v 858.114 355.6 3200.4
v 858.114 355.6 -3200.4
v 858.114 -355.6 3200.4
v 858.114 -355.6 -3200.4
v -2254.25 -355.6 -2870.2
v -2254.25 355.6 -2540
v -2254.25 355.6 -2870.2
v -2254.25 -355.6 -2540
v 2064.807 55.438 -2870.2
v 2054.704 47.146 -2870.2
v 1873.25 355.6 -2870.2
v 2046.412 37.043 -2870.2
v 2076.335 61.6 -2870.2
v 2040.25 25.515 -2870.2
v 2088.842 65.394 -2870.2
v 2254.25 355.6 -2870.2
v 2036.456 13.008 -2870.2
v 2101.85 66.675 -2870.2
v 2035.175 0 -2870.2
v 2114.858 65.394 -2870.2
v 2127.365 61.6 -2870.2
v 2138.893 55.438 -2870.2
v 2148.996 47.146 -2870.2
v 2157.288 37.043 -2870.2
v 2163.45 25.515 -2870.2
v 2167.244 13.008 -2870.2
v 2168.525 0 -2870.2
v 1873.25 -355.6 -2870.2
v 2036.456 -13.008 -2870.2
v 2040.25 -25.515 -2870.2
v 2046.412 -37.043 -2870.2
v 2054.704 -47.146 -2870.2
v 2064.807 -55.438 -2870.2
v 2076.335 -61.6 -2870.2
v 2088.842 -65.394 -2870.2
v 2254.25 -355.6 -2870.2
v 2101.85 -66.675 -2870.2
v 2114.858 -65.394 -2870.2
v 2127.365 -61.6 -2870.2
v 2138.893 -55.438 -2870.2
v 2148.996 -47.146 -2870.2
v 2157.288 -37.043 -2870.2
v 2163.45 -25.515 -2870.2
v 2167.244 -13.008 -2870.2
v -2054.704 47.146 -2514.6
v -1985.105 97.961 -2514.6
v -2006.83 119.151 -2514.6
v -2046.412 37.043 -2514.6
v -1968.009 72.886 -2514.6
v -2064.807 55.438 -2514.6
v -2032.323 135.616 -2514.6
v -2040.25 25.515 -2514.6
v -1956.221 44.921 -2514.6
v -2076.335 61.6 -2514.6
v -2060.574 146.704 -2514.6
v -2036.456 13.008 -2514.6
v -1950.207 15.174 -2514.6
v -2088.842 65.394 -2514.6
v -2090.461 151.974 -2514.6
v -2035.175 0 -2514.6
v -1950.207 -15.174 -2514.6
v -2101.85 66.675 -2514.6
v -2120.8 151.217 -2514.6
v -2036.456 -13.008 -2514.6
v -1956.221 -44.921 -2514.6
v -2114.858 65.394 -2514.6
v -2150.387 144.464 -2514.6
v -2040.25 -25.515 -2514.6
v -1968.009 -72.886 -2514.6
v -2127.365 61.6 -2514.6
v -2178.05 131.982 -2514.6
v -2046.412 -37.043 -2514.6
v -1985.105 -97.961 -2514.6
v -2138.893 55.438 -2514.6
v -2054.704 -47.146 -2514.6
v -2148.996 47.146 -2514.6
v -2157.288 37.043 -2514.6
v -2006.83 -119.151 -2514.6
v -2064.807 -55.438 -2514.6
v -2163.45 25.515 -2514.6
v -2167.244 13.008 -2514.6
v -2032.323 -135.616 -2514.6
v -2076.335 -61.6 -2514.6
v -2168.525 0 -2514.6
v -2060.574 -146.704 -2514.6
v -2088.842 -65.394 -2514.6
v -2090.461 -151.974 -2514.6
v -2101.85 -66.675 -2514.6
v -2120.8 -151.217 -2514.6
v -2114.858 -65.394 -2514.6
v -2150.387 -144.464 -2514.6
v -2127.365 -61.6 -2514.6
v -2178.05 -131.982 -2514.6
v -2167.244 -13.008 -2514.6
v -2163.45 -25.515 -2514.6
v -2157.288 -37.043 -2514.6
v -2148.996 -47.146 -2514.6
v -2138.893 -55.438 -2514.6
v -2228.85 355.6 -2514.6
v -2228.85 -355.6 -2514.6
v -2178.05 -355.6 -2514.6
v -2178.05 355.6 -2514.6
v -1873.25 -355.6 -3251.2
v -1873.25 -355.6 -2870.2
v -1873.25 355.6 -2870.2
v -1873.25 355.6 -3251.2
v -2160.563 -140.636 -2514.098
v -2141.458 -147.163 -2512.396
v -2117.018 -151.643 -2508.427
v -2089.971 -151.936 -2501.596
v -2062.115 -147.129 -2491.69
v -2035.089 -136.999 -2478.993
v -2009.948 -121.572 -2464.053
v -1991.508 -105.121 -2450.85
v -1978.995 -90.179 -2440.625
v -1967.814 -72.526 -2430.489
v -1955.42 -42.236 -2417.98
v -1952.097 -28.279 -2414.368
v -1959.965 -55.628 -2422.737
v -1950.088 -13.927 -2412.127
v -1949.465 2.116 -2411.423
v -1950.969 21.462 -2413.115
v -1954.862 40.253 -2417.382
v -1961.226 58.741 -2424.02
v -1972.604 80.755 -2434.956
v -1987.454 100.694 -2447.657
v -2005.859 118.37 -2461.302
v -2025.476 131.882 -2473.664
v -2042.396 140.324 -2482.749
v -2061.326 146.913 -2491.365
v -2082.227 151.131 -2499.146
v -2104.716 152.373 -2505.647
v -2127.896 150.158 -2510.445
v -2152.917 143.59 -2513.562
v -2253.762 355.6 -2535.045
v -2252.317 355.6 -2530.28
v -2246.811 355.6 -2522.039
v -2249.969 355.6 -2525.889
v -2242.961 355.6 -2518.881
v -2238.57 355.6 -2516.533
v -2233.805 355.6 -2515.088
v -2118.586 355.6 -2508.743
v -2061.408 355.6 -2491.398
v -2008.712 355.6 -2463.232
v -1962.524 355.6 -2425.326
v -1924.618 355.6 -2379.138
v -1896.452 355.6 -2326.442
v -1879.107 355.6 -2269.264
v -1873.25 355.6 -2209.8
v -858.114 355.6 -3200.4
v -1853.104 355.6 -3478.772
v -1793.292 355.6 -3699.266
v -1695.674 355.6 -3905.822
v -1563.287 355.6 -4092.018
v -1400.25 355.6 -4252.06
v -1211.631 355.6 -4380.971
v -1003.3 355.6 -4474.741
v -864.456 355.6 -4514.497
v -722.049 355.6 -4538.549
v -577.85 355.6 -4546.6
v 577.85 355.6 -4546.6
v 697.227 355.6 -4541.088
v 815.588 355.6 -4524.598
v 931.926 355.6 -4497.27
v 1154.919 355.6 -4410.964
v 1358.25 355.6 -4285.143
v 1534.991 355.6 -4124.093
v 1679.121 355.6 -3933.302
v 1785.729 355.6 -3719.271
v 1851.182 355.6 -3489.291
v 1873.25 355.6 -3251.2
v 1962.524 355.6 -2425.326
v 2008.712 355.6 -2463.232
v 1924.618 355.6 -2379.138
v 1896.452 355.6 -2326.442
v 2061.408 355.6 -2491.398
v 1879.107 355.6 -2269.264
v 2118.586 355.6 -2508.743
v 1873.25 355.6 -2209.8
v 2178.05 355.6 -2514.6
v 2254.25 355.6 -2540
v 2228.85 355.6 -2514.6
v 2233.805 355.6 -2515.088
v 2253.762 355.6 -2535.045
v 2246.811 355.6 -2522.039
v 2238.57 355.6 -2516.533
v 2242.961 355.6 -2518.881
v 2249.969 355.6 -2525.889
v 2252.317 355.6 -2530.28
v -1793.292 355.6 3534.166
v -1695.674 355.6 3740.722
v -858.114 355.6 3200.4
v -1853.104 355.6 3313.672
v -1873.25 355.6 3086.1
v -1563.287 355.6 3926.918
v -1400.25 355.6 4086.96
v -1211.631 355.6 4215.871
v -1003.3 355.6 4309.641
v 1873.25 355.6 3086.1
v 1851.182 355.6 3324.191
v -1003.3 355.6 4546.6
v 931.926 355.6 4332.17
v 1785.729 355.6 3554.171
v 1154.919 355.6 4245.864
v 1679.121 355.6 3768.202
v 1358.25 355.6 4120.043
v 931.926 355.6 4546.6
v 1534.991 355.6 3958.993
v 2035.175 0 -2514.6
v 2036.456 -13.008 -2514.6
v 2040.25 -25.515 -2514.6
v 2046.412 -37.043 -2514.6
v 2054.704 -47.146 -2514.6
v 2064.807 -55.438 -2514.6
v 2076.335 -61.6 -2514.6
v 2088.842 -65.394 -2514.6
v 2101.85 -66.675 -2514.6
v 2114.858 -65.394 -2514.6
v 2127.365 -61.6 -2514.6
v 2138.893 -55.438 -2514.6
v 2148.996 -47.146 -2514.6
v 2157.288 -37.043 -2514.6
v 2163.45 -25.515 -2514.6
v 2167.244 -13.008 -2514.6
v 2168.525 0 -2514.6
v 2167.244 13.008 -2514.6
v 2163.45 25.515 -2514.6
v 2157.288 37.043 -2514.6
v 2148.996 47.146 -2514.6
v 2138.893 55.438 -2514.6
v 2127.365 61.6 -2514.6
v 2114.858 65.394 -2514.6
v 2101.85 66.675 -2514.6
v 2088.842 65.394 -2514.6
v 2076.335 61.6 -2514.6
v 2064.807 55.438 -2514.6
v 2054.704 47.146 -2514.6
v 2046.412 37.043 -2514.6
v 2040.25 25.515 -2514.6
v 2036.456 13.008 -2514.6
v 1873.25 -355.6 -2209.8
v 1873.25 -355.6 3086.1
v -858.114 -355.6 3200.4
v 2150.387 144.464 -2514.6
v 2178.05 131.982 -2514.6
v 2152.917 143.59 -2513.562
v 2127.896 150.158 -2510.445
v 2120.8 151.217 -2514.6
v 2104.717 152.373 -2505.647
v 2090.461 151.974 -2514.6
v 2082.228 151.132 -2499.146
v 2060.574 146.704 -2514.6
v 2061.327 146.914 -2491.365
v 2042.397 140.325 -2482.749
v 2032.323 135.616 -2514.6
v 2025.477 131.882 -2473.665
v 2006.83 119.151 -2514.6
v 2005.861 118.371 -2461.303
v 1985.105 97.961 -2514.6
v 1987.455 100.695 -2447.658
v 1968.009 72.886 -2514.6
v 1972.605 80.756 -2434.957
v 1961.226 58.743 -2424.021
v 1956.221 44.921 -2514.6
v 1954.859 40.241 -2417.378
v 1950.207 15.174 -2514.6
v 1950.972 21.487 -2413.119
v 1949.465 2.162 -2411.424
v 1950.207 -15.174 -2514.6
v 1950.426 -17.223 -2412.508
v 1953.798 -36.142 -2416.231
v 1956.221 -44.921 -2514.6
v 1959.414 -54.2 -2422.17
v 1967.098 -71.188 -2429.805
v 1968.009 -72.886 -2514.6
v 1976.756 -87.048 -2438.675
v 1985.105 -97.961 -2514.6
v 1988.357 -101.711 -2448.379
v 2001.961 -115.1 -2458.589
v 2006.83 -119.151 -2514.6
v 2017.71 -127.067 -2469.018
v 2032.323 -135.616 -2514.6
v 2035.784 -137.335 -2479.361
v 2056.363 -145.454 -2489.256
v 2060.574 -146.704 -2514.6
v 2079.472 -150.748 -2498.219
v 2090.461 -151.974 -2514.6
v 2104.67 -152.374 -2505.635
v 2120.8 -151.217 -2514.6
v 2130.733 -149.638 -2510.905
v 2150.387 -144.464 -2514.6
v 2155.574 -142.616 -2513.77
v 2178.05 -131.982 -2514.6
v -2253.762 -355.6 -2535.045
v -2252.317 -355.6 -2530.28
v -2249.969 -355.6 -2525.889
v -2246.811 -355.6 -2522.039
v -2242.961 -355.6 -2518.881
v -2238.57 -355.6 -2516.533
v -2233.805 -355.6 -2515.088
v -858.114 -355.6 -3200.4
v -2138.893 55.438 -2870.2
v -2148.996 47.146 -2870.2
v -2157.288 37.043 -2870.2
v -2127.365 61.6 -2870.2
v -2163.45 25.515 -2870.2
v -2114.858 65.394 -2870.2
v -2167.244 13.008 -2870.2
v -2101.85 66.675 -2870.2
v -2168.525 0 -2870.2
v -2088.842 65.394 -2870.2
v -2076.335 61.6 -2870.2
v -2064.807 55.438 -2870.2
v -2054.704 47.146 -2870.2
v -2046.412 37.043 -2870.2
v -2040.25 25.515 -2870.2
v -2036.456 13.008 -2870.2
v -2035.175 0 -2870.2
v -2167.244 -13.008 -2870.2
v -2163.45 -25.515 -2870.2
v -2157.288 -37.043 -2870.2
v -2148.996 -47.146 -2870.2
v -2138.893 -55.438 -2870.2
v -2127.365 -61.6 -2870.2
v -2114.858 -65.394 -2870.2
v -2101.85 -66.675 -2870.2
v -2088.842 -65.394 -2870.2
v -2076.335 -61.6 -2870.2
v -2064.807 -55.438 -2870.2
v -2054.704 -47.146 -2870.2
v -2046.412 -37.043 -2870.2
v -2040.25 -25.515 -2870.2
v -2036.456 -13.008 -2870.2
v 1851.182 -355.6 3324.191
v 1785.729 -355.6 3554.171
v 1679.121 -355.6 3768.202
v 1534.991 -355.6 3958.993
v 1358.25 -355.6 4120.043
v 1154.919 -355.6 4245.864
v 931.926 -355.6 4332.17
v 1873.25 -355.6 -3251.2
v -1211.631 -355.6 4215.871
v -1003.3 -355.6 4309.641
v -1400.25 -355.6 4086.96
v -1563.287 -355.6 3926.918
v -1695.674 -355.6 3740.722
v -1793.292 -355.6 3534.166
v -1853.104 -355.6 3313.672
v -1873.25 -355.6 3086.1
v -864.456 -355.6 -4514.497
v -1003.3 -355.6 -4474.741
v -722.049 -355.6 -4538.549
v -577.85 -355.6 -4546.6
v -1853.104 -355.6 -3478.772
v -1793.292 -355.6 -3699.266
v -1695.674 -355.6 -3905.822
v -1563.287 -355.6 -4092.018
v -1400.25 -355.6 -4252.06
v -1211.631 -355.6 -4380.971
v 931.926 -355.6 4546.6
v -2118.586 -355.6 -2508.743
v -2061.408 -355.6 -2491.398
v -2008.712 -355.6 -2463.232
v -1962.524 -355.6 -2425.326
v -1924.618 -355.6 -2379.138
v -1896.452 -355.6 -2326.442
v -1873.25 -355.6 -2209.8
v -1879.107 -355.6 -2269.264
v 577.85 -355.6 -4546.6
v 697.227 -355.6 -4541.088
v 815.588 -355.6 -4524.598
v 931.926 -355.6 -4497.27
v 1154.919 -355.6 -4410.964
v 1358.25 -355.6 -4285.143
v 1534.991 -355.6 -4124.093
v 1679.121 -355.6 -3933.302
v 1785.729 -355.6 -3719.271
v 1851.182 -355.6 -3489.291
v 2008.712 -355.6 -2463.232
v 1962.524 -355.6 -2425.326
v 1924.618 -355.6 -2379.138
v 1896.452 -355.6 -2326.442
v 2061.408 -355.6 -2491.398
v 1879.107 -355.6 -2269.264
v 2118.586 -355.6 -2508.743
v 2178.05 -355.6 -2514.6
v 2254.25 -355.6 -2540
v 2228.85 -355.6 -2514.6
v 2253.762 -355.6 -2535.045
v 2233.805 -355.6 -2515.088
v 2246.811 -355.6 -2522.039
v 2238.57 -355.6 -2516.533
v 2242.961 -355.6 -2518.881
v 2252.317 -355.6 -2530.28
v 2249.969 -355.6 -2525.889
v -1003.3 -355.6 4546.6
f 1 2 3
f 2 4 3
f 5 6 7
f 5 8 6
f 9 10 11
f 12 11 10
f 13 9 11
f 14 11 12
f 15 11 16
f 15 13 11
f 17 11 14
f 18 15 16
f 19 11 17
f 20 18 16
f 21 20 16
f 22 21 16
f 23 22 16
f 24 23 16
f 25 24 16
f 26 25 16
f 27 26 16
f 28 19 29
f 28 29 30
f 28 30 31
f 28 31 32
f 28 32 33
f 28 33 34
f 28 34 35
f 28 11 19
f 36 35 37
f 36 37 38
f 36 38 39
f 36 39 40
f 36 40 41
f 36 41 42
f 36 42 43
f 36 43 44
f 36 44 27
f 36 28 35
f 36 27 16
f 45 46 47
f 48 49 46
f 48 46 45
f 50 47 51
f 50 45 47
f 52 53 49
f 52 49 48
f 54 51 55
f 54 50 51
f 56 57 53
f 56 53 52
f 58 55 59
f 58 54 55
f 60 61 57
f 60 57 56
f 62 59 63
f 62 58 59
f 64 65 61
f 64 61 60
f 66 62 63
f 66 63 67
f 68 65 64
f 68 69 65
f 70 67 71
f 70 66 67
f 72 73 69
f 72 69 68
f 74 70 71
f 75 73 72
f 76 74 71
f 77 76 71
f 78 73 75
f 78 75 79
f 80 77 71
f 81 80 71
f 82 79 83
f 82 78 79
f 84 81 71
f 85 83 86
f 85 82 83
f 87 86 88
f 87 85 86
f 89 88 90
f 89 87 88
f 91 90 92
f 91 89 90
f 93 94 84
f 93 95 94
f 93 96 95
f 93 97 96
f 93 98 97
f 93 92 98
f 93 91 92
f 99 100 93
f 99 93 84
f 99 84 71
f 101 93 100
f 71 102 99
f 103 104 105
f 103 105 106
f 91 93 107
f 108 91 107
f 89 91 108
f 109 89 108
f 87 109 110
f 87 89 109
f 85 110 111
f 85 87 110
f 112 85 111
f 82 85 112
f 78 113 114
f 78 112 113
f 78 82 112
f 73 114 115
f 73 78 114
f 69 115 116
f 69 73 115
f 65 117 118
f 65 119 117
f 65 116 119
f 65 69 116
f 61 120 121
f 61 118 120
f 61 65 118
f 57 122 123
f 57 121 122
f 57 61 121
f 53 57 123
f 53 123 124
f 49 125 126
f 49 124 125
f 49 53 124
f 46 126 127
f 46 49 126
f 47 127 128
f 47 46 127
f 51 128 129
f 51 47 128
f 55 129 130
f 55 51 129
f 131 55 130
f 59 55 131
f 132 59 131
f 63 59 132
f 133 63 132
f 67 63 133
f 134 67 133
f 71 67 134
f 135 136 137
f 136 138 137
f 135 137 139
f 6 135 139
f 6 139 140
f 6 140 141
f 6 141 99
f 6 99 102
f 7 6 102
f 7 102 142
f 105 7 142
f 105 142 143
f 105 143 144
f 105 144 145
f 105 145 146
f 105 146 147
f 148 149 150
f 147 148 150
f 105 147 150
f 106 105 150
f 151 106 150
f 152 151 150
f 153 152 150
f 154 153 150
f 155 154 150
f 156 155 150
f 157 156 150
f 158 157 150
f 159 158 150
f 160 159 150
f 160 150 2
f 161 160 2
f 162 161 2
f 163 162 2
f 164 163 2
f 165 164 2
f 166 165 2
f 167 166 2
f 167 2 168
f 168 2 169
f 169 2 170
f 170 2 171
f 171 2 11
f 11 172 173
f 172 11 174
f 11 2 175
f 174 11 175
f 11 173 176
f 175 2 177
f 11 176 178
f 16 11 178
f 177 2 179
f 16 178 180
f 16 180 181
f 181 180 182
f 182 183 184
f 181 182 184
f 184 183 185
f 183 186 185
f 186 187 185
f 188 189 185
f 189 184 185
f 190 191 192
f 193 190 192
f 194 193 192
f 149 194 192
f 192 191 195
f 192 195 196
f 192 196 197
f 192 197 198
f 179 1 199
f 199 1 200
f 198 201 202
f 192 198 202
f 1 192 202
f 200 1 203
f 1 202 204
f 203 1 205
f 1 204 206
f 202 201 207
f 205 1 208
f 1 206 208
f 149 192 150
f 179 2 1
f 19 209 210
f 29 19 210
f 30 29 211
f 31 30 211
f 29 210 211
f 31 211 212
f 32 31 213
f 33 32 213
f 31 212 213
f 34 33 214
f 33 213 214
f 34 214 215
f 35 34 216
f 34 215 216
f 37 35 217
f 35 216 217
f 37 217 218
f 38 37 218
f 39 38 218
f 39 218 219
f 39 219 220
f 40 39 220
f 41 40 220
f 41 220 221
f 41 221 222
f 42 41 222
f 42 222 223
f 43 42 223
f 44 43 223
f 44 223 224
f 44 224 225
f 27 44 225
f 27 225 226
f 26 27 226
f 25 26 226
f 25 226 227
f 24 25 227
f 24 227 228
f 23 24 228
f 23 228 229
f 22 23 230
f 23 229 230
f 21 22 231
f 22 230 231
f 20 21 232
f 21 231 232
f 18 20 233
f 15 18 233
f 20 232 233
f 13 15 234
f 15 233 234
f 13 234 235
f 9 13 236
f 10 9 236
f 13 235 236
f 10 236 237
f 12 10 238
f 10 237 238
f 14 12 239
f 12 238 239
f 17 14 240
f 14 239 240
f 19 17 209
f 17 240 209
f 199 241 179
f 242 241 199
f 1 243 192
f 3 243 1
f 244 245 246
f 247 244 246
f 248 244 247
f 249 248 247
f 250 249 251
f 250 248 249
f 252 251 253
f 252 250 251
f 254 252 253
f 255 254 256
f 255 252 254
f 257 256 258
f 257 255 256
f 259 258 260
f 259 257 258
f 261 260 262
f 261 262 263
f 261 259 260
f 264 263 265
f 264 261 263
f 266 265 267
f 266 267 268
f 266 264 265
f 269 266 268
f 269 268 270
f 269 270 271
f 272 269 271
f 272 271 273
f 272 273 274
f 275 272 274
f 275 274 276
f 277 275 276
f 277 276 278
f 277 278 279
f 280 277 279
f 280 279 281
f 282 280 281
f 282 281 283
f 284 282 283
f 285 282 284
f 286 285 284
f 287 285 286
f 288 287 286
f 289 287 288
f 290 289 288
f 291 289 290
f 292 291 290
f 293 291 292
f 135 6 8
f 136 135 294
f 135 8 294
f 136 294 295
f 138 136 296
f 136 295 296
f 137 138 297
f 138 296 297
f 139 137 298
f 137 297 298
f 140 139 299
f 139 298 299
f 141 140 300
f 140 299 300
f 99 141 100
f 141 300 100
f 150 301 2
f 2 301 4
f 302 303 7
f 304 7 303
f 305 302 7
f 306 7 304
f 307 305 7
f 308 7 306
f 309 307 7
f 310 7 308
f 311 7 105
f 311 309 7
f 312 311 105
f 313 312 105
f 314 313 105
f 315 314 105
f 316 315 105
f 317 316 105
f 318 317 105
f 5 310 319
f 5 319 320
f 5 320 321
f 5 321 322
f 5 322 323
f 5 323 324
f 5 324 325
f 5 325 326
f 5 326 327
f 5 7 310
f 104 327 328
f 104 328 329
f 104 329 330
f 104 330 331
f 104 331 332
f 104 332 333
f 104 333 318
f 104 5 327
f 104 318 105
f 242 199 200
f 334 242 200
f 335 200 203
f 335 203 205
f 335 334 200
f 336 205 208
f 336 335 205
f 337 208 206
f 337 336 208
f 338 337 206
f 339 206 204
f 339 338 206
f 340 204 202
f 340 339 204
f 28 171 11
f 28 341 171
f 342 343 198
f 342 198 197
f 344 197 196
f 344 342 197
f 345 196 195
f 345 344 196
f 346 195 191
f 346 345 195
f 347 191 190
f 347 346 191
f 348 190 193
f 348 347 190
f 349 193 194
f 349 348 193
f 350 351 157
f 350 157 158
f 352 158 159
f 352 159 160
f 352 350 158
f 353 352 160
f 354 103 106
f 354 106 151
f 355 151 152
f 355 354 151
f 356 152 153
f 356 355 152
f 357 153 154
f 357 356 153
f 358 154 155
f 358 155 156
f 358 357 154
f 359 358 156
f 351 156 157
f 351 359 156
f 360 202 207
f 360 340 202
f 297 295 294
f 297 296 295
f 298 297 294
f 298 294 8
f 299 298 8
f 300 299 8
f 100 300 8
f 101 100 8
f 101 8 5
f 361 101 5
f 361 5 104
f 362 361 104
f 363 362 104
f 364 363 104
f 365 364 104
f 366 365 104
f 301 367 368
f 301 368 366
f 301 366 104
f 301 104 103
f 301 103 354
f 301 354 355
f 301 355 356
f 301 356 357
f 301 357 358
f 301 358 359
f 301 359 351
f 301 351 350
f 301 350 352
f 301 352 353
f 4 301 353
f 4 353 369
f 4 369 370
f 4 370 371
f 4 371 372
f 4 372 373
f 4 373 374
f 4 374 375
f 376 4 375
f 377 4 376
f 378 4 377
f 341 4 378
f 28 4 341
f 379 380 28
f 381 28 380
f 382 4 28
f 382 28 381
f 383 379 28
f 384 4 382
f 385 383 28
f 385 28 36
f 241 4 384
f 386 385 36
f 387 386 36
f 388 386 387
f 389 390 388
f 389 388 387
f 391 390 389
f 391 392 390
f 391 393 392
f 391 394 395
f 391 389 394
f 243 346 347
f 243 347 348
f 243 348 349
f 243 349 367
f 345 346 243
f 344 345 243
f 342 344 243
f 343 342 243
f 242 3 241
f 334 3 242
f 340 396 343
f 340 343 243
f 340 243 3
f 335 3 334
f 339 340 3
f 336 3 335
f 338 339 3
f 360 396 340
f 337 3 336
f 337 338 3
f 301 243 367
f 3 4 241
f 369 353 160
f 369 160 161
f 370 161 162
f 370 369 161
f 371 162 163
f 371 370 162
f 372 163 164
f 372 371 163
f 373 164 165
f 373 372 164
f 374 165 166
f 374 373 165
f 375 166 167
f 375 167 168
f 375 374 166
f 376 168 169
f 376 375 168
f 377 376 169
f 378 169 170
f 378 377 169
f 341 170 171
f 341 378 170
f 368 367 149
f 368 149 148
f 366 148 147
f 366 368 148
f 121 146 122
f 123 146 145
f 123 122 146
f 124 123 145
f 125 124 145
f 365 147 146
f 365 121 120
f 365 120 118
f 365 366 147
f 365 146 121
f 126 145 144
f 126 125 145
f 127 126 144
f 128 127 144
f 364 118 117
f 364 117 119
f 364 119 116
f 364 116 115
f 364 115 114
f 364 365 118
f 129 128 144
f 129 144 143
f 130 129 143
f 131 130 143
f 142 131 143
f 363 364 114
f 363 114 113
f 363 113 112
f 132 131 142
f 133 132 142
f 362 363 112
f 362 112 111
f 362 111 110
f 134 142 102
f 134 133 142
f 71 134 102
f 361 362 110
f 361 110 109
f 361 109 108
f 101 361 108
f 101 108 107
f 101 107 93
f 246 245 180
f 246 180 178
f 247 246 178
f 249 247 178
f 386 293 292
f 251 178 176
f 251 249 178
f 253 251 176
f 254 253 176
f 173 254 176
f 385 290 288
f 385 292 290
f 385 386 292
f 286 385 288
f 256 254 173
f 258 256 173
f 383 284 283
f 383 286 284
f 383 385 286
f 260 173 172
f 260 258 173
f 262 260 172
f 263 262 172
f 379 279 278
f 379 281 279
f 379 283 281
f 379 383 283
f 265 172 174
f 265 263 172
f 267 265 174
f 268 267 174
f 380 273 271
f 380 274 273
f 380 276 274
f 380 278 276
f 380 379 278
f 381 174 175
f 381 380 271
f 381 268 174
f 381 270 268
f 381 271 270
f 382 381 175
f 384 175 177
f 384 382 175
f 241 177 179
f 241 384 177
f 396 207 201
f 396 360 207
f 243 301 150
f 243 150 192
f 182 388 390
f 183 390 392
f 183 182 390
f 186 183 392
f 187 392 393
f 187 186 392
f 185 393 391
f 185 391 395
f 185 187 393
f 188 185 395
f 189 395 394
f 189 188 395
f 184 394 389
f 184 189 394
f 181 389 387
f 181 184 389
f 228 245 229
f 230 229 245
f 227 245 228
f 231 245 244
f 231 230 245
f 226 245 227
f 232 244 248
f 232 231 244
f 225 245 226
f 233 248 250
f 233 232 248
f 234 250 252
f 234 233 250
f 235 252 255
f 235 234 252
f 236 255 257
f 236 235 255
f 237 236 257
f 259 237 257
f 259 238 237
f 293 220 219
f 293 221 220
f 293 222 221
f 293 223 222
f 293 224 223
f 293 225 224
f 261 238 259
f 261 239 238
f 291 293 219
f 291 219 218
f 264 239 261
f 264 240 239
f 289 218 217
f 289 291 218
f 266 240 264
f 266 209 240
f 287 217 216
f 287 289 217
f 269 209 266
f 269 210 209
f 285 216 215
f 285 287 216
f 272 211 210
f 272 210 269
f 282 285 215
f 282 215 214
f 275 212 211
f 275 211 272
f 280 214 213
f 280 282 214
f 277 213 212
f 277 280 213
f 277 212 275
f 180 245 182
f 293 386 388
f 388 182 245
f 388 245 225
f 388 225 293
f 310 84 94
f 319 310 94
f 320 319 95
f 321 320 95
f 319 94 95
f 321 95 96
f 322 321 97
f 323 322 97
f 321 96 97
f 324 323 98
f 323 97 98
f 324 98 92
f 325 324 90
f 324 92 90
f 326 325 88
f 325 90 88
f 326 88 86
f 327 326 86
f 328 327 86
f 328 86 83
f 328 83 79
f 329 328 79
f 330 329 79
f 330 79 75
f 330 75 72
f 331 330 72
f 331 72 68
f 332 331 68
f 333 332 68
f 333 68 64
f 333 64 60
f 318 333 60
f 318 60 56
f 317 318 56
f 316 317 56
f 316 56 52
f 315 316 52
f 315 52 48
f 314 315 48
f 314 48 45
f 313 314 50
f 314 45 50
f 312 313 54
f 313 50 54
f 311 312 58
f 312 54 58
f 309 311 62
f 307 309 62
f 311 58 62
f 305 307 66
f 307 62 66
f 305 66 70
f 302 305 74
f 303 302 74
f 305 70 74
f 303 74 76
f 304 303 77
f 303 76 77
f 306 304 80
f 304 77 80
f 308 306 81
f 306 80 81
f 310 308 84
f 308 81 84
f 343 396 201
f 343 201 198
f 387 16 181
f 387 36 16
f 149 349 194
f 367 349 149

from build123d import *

# Parameters (mm, degrees)
F0_W     = 1716.2272
F0_H     = 6400.8
F1_DEPTH = 355.6
F2_R     = 25.4
F4_D     = 133.35
F5_R     = 152.4
F6_DEPTH = 7061.201


with BuildPart() as f1:
    # F0 (on Front) → F1 (new body, symmetric)
    with BuildSketch(Plane.XZ):
        with BuildLine():
            Line((931.926, 4546.6), (-1003.3, 4546.6))
            Line((-1003.3, 4546.6), (-1003.3, 4309.641359))
            ThreePointArc((-1003.3, 4309.641359), (-1633.593598, 3836.744133), (-1873.25, 3086.1))
            Line((-1873.25, 3086.1), (-1873.25, -2209.8))
            ThreePointArc((-1873.25, -2209.8), (-1962.523853, -2425.326147), (-2178.05, -2514.6))
            Line((-2178.05, -2514.6), (-2254.25, -2514.6))
            Line((-2254.25, -2514.6), (-2254.25, -2870.2))
            Line((-2254.25, -2870.2), (-1873.25, -2870.2))
            Line((-1873.25, -2870.2), (-1873.25, -3251.2))
            ThreePointArc((-1873.25, -3251.2), (-1633.593598, -4001.844133), (-1003.3, -4474.741359))
            ThreePointArc((-1003.3, -4474.741359), (-793.5879, -4528.509014), (-577.85, -4546.6))
            Line((-577.85, -4546.6), (577.85, -4546.6))
            ThreePointArc((577.85, -4546.6), (756.597886, -4534.208322), (931.926, -4497.270362))
            ThreePointArc((931.926, -4497.270362), (1611.467727, -4032.030042), (1873.25, -3251.2))
            Line((1873.25, -3251.2), (1873.25, -2870.2))
            Line((1873.25, -2870.2), (2254.25, -2870.2))
            Line((2254.25, -2870.2), (2254.25, -2514.6))
            Line((2254.25, -2514.6), (2178.05, -2514.6))
            ThreePointArc((2178.05, -2514.6), (1962.523853, -2425.326147), (1873.25, -2209.8))
            Line((1873.25, -2209.8), (1873.25, 3086.1))
            ThreePointArc((1873.25, 3086.1), (1611.467727, 3866.930042), (931.926, 4332.170362))
            Line((931.926, 4332.170362), (931.926, 4546.6))
        make_face()
        Rectangle(F0_W, F0_H, mode=Mode.SUBTRACT)
    extrude(amount=F1_DEPTH, both=True)

    # F2
    f2_edges = [f1.edges().sort_by_distance(p)[0] for p in [
        (2254.25, 177.8, -2514.6),
        (-2254.25, 177.8, -2514.6),
    ]]
    fillet(f2_edges, radius=F2_R)

    # F4 (through all)
    with Locations(Plane(origin=(0, 0, -2870.2), x_dir=(1, 0, 0), z_dir=(0, 0, -1))):
        with Locations((-2101.85, 0), (2101.85, 0)):
            Hole(F4_D / 2)

    # F5 (on face) → F6 (cut, through all)
    with BuildSketch(Plane.XY.offset(-2514.6)):
        with Locations((-2101.85, 0)):
            Circle(F5_R)
        with Locations((2101.85, 0)):
            Circle(F5_R)
    extrude(amount=F6_DEPTH, mode=Mode.SUBTRACT)


solid = f1.part
